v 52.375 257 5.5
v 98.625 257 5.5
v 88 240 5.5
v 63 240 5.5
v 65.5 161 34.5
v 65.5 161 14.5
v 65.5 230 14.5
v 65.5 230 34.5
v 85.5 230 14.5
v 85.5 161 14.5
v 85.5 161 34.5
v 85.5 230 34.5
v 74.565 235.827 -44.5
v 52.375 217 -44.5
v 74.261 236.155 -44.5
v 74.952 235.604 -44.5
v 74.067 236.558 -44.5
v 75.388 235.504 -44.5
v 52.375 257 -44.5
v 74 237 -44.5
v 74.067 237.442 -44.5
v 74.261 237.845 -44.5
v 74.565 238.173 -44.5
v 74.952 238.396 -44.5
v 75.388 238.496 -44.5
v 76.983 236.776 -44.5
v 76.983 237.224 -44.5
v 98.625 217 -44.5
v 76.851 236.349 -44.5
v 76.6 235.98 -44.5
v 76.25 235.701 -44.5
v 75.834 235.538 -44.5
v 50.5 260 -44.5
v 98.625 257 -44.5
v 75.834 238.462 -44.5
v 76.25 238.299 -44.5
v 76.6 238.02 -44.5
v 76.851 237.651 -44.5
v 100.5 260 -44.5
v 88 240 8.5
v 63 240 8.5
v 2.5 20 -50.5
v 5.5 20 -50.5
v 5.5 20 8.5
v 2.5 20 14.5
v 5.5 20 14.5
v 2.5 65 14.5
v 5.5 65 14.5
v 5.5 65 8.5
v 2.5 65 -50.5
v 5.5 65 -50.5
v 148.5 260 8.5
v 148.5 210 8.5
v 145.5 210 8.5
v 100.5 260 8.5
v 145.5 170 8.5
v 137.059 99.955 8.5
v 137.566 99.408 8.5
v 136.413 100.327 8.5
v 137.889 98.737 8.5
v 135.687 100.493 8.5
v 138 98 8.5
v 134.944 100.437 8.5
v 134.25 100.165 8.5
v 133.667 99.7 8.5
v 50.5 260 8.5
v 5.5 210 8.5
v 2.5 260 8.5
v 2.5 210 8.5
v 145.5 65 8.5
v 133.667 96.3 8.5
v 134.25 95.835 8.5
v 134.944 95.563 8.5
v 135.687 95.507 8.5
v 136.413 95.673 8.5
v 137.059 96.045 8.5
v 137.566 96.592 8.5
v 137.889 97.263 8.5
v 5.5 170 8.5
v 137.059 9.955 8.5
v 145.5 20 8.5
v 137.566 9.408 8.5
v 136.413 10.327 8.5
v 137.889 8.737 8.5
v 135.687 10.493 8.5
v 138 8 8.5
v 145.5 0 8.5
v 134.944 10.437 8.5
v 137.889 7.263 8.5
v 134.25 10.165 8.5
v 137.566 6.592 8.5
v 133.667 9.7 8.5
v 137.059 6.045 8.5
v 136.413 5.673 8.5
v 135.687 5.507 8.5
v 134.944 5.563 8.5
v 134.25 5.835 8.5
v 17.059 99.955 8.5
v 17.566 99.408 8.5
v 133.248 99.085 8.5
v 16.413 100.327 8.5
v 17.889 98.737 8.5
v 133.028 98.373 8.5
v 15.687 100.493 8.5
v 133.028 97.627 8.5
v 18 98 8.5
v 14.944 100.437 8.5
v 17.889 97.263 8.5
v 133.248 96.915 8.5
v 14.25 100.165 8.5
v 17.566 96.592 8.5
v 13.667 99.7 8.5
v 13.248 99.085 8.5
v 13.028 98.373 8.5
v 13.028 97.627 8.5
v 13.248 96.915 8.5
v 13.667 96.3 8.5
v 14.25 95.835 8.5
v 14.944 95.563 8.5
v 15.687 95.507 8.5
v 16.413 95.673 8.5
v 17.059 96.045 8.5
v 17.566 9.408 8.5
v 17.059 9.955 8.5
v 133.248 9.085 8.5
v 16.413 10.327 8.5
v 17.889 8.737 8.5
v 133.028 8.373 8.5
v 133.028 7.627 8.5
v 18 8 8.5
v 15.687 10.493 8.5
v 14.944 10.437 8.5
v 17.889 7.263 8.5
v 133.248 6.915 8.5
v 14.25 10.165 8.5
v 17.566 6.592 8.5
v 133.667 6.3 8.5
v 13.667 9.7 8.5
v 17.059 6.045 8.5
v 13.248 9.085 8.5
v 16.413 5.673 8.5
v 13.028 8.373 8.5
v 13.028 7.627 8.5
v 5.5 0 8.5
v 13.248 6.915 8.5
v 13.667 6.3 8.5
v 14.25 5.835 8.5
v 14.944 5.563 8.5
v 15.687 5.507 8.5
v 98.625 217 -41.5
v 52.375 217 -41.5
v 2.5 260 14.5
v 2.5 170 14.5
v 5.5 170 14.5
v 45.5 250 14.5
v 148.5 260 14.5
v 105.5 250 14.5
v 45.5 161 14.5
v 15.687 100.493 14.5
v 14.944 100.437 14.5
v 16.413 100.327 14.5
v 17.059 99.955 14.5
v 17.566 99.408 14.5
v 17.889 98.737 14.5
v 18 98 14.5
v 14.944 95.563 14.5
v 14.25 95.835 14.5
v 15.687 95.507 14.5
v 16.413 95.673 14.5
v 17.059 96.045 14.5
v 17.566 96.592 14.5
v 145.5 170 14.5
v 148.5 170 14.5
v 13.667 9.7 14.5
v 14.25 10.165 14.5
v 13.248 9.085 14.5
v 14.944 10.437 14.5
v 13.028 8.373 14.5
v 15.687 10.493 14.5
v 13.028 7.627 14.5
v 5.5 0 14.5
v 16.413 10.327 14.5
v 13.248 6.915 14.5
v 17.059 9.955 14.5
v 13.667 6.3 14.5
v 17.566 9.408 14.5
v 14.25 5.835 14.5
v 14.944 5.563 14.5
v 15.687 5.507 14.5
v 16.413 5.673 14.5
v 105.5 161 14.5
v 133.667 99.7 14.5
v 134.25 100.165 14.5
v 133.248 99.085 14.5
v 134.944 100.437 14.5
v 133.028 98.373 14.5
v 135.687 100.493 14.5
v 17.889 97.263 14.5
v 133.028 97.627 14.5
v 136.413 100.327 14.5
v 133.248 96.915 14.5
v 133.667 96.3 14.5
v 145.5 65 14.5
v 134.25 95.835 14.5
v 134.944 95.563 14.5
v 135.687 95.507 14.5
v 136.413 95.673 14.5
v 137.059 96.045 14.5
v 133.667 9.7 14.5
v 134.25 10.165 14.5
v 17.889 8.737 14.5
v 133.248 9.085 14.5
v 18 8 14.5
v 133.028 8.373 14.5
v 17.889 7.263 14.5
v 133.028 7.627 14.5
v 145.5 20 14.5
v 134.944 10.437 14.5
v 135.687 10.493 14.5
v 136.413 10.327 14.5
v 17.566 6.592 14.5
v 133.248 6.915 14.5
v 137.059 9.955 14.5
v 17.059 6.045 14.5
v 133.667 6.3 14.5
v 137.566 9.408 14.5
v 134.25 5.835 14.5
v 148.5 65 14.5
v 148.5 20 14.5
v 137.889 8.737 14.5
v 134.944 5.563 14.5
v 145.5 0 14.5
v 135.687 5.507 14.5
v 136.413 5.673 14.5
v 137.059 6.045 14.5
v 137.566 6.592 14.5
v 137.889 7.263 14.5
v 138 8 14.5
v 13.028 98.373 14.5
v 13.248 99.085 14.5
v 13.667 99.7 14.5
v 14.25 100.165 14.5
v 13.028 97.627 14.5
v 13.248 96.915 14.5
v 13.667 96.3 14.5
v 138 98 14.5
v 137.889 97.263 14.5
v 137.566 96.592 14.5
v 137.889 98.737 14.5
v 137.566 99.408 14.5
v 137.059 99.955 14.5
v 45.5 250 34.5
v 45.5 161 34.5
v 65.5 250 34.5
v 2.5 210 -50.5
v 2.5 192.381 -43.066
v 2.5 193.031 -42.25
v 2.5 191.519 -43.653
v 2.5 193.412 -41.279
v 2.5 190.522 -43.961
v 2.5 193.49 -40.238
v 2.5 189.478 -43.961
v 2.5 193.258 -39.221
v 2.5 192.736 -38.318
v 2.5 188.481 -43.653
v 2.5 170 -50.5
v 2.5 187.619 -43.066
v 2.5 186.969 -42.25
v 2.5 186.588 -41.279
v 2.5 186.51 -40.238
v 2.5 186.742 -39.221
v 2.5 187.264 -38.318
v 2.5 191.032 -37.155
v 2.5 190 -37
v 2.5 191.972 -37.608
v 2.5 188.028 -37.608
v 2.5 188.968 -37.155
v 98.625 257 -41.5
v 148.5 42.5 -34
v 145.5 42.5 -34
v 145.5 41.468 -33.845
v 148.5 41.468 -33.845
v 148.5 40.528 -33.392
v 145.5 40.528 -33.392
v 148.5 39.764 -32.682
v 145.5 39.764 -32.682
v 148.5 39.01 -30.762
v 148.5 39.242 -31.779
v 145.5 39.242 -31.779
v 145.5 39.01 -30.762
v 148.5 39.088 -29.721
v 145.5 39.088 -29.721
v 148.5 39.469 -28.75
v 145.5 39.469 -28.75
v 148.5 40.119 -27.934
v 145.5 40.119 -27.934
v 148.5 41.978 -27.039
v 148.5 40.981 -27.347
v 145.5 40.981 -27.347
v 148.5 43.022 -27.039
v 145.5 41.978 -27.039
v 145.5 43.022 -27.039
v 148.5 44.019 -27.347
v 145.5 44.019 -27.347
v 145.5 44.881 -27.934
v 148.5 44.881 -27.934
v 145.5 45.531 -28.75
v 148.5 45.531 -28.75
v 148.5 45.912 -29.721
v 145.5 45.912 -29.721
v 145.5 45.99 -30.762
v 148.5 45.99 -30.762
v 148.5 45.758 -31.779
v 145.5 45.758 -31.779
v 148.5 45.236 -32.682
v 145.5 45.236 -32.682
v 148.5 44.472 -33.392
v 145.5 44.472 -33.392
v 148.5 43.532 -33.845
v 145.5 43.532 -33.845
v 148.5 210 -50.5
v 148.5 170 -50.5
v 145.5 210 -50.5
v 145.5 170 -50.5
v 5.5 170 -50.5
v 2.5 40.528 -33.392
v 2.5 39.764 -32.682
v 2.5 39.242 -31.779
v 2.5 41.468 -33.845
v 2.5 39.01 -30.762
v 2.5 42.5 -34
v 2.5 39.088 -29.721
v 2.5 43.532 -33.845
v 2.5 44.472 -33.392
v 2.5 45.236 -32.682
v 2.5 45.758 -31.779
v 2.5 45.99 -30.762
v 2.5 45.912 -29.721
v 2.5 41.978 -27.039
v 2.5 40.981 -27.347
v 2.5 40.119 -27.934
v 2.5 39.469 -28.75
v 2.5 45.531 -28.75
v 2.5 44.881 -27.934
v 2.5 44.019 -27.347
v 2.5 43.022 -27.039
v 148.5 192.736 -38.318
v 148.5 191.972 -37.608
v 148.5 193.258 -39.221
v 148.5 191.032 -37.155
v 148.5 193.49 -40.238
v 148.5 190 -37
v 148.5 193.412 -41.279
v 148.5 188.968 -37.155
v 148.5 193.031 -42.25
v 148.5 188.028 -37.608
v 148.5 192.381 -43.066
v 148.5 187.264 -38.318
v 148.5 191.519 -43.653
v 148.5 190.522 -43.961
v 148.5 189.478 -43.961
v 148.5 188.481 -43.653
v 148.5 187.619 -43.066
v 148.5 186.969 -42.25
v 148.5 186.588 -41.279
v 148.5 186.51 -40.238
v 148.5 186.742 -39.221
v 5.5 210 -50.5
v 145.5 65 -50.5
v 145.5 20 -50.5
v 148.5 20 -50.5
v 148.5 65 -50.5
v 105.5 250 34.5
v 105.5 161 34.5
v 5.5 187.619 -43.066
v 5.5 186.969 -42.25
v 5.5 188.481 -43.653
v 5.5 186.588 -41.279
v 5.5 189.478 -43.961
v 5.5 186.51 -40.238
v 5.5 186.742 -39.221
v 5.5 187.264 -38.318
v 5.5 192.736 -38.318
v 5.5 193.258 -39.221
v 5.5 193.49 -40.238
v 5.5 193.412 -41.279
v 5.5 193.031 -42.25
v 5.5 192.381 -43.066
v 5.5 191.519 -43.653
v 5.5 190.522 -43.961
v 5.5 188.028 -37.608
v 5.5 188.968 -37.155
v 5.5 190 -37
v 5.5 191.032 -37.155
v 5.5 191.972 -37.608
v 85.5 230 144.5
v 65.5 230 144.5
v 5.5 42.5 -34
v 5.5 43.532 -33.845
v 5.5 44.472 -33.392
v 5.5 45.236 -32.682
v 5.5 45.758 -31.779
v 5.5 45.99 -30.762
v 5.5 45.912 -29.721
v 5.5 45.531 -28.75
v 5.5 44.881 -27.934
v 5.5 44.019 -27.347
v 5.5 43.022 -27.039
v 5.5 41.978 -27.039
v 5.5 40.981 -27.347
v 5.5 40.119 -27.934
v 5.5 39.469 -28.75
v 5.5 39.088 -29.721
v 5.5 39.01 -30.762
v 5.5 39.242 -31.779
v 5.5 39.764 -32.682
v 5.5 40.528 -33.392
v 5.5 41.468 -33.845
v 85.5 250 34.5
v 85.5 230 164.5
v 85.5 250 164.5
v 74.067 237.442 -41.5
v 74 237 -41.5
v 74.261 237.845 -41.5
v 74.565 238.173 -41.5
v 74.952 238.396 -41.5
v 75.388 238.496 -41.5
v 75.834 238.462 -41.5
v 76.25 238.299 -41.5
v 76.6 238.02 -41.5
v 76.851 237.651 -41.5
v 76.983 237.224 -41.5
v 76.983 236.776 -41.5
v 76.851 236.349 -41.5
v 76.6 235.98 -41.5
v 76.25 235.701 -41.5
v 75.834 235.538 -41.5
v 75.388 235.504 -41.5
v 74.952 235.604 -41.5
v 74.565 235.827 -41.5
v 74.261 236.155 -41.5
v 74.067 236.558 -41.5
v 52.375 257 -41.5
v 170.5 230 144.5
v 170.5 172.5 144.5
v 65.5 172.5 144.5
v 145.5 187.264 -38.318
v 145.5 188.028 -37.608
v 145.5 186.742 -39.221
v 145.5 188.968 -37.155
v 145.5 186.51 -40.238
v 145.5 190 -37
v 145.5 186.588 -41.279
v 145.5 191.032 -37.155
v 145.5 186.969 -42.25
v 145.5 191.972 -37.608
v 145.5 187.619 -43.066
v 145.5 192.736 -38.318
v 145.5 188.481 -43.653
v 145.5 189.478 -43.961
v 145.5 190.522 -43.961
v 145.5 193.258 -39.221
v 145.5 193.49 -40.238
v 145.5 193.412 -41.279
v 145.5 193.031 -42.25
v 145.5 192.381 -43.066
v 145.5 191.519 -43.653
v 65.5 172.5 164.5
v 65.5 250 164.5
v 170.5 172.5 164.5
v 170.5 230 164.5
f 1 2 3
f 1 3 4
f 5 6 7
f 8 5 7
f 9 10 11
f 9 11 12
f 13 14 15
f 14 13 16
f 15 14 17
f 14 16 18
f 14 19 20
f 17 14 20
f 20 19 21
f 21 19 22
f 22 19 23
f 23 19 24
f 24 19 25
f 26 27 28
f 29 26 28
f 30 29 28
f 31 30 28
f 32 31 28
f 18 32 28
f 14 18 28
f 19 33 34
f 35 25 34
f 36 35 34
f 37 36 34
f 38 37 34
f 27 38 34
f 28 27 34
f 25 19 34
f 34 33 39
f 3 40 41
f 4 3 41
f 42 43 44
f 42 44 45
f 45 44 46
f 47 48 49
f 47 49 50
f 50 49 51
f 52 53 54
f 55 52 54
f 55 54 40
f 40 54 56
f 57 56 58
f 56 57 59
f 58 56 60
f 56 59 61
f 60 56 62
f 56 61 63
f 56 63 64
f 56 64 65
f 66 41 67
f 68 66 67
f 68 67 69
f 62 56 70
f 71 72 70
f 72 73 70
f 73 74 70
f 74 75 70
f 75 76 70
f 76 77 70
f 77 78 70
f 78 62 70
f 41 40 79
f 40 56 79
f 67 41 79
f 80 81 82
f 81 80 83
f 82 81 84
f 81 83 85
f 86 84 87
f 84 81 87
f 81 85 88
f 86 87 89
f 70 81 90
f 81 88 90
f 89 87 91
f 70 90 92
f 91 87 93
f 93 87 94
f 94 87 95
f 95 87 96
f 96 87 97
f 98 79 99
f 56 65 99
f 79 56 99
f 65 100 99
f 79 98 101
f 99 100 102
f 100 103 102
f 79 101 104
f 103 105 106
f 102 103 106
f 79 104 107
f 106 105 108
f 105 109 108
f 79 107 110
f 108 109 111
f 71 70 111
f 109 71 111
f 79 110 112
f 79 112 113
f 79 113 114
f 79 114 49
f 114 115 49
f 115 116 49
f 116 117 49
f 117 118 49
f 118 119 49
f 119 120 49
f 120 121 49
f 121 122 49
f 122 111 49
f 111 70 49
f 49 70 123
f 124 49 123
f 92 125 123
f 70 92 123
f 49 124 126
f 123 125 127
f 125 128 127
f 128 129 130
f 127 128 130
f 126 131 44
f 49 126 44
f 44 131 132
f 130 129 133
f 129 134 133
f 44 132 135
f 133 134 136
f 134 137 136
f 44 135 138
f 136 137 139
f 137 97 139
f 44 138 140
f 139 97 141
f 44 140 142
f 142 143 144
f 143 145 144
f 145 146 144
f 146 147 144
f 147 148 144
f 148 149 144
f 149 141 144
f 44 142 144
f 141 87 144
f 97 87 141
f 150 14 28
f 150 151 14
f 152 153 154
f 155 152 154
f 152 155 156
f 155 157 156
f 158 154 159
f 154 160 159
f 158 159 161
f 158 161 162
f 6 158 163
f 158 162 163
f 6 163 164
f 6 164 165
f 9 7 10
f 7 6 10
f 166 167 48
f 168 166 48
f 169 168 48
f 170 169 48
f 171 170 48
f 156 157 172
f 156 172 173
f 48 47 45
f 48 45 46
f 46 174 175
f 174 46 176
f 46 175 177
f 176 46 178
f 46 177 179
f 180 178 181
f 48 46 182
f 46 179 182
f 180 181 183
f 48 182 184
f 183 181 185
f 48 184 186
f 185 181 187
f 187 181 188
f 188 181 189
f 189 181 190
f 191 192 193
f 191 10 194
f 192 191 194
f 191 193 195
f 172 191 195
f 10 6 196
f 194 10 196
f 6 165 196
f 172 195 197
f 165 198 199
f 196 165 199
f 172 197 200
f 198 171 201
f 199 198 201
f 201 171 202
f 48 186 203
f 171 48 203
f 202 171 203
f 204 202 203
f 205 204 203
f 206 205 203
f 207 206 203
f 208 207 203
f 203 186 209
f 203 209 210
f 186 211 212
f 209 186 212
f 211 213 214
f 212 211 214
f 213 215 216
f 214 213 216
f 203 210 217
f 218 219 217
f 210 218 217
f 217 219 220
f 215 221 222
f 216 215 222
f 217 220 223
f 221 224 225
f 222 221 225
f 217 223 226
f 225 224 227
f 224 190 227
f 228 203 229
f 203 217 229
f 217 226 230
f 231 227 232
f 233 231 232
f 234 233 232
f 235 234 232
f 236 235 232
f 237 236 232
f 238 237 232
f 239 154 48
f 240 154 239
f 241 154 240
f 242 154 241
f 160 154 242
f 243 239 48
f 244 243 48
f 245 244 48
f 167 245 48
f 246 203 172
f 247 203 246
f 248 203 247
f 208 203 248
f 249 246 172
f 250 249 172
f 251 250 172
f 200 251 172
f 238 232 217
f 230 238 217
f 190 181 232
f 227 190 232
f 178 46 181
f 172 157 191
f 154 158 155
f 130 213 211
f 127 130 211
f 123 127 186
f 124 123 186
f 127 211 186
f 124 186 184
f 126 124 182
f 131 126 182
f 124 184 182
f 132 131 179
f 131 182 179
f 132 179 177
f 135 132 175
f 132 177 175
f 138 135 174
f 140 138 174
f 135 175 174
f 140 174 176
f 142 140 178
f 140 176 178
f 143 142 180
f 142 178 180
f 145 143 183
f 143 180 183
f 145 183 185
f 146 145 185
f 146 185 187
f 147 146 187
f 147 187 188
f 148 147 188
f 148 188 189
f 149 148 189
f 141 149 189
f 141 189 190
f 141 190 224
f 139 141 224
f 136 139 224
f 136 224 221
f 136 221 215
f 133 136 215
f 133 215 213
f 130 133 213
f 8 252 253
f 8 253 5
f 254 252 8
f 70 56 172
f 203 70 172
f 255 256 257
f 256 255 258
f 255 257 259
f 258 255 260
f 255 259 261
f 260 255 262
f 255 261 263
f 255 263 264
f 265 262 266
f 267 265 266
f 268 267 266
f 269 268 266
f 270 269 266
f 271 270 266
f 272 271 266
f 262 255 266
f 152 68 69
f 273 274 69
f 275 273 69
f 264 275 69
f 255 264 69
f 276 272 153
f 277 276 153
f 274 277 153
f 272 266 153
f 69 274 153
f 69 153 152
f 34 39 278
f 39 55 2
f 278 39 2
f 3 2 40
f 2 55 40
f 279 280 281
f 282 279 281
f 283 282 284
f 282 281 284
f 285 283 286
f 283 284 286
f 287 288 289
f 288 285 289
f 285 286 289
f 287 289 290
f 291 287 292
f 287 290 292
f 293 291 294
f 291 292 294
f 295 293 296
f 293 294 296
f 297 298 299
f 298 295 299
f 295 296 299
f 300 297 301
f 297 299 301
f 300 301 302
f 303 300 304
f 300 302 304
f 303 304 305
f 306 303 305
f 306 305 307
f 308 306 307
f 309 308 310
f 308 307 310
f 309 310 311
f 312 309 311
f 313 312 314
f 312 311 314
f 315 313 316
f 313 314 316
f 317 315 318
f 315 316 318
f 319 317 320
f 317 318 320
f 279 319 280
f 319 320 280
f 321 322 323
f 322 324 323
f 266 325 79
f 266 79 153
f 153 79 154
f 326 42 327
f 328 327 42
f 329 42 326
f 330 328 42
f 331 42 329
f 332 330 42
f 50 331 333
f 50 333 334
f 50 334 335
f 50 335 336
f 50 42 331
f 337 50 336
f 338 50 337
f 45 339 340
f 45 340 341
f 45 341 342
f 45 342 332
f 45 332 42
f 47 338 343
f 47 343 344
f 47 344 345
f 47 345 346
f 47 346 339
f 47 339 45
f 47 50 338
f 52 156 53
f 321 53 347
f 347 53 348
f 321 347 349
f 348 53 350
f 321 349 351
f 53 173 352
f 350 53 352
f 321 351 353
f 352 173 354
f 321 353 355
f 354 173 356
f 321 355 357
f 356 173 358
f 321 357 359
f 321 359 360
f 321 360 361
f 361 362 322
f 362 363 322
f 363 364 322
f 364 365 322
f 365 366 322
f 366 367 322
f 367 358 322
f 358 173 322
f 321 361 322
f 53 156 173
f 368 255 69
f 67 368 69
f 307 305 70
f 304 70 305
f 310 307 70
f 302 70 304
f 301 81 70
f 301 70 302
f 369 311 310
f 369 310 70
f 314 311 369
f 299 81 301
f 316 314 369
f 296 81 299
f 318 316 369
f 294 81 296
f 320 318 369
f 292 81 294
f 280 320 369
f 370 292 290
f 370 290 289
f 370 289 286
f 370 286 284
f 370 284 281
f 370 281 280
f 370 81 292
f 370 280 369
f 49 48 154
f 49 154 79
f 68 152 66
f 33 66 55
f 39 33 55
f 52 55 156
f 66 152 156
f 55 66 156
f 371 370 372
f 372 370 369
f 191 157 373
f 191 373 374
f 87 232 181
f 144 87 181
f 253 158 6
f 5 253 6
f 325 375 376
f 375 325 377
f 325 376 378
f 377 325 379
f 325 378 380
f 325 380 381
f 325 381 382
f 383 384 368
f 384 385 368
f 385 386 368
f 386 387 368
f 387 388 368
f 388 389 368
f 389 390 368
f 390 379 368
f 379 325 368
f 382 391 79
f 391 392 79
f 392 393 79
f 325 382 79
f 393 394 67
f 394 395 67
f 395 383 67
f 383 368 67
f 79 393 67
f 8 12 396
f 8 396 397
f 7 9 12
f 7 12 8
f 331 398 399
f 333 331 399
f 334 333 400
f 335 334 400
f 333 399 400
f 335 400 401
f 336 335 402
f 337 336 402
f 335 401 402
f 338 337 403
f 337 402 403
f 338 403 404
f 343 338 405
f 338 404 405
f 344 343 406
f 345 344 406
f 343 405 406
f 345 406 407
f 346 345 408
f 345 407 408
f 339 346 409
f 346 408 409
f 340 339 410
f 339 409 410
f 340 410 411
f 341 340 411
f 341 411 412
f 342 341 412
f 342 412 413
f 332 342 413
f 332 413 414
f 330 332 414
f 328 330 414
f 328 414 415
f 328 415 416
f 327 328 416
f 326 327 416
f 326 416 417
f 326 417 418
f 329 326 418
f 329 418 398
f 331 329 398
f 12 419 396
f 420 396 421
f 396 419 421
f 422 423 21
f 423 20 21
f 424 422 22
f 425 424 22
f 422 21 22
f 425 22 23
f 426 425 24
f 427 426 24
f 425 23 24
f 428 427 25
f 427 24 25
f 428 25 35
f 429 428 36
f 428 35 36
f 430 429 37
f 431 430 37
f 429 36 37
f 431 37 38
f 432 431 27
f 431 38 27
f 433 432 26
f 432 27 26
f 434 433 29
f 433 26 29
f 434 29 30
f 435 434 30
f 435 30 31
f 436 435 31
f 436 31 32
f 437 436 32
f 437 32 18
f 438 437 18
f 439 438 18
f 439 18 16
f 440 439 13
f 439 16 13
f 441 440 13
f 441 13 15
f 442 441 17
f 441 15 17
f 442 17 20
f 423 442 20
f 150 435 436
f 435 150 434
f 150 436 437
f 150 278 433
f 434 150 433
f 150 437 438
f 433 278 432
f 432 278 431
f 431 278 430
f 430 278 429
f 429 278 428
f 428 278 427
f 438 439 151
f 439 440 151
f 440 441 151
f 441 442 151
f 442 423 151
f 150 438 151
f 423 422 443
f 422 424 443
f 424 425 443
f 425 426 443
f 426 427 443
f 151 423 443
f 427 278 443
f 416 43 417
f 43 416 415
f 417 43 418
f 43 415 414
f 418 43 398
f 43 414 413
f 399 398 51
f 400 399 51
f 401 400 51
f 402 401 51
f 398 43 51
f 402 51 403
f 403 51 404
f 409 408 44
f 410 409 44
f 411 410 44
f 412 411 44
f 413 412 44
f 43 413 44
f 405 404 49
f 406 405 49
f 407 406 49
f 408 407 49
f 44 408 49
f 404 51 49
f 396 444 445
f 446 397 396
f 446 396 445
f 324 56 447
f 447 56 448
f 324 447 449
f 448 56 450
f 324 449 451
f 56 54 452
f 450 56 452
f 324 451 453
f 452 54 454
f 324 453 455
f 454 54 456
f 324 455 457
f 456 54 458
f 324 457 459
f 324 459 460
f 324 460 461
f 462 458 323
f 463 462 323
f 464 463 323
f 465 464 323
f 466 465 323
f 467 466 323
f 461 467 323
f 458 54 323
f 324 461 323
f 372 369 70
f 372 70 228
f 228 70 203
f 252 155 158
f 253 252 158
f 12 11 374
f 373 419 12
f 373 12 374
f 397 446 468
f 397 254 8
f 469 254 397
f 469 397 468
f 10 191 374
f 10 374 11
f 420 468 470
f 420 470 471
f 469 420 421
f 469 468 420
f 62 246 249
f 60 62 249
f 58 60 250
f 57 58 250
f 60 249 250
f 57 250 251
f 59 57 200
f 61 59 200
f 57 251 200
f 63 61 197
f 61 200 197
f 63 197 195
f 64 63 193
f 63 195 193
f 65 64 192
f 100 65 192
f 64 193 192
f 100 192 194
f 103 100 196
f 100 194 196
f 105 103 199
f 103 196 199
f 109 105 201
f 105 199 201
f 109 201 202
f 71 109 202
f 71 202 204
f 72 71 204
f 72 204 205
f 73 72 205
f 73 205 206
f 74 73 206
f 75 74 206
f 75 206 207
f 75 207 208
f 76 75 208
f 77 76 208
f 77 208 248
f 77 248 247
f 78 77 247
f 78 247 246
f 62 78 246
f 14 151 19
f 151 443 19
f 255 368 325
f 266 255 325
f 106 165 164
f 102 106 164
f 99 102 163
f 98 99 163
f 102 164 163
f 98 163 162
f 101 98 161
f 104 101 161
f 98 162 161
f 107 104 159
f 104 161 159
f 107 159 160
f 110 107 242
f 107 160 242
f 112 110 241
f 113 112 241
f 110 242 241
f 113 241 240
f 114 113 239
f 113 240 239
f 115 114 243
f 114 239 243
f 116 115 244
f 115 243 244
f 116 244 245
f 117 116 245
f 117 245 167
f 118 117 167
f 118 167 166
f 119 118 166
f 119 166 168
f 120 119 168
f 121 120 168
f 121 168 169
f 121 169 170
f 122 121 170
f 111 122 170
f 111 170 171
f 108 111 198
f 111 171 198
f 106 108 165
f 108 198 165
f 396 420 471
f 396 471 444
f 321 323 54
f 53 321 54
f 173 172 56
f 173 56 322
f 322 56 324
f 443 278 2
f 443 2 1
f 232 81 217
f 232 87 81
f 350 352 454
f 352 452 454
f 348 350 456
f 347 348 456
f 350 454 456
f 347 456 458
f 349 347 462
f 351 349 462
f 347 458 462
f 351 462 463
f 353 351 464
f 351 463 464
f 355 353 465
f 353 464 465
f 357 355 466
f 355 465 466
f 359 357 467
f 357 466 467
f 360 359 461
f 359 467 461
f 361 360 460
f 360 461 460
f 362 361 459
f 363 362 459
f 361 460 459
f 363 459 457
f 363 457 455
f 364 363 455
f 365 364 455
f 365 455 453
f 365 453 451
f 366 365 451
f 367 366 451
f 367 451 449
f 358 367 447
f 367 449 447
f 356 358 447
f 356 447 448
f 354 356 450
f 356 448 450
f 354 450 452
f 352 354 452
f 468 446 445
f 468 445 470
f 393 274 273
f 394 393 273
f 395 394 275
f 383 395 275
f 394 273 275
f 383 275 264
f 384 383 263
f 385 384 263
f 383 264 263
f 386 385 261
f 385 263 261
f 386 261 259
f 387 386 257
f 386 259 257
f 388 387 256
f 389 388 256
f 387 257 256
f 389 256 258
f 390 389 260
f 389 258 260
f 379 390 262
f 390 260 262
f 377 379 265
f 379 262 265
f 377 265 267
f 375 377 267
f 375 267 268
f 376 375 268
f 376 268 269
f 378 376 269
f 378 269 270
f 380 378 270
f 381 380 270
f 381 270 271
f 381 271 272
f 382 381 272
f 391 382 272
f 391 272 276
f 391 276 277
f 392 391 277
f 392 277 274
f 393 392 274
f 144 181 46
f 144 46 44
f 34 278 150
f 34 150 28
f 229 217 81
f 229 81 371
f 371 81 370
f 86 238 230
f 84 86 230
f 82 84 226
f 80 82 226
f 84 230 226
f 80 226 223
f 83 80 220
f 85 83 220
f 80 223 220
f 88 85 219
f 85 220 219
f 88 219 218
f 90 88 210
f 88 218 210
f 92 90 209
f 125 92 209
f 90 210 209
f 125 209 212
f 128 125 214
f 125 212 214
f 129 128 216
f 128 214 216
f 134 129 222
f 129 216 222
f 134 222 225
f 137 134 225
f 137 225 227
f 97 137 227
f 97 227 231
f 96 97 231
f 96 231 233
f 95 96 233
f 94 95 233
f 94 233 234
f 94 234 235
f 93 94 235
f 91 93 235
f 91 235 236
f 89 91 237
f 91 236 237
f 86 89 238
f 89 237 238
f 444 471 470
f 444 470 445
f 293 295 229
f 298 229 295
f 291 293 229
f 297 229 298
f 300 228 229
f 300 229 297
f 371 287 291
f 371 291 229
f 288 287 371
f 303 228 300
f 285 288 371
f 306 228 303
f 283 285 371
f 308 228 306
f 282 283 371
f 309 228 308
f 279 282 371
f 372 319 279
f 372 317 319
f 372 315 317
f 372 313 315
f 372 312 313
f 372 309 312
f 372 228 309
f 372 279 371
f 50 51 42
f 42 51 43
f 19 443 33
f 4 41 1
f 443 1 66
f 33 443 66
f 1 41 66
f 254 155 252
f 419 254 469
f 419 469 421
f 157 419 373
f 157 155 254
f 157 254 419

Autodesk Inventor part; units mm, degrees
sketch "Sketch2" plane through (0, 0, 0) normal (0, 1, 0) x (-1, 0, 0)
  line L0 (-25.5, 14.5) -> (-5.5, 14.5)
  line L1 (-5.5, 14.5) -> (-5.5, -5.5)
  line L2 (-5.5, -5.5) -> (-25.5, -5.5)
  line L3 (-25.5, -5.5) -> (-25.5, 14.5)
  line L4 (-25.5, 14.5) -> (-5.5, -5.5) construction
  line L5 (-5.5, 14.5) -> (-25.5, -5.5) construction
  point P0 (0, 0)
  point P1 (-15.5, 4.5)
  dimension "d0" = 20
  dimension "d1" = 20
extrude "Extrusion1" add sketch "Sketch2" along normal blind 210
sketch "Sketch3" plane through (25.5, 0, 14.5) normal (1, 0, 0) x (0, 0, -1)
  line L0 (20, 0) -> (20, 210) projected
  line L1 (0, 137.5) -> (20, 137.5)
  line L2 (20, 137.5) -> (20, 117.5)
  line L3 (20, 117.5) -> (0, 117.5)
  line L4 (0, 117.5) -> (0, 137.5)
  line L5 (0, 137.5) -> (20, 117.5) construction
  line L6 (20, 137.5) -> (0, 117.5) construction
  point P0 (14.5, 0)
  point P1 (10, 127.5)
  dimension "d4" = 20
extrude "Extrusion2" add sketch "Sketch3" along normal blind 100
ref_plane "Work Plane1" through (75.5, 0, 14.5) normal (1, 0, 0) x (0, 0, -1)
mirror "Mirror1" about plane through (75.5, 0, 14.5) normal (1, 0, 0) of "Extrusion1"
sketch "Sketch4" plane through (5.5, 0, 14.5) normal (0, 0, 1) x (1, 0, 0)
  line L0 (60, 250) -> (80, 250)
  line L1 (80, 250) -> (80, 230)
  line L2 (80, 230) -> (60, 230)
  line L3 (60, 230) -> (60, 250)
  line L4 (60, 250) -> (80, 230) construction
  line L5 (80, 250) -> (60, 230) construction
  point P0 (-5.5, 0)
  point P1 (20, 112.5)
  point P2 (70, 240)
extrude "Extrusion3" add sketch "Sketch4" along normal blind 150
sketch "Sketch11" plane through (5.5, 0, 14.5) normal (0, 0, 1) x (1, 0, 0)
  circle A0 centre (10, 8) radius 2.5
  circle A1 centre (10, 98) radius 2.5
  circle A2 centre (130, 8) radius 2.5
  circle A3 centre (130, 98) radius 2.5
  point P0 (-5.5, 0)
  dimension "d25" = 5
  dimension "d28" = 90
  dimension "d31" = 120
  dimension "d39" = 120
extrude "Extrusion10" cut sketch "Sketch11" against normal blind 36
sketch "Sketch13" plane through (5.5, 0, 14.5) normal (0, 0, 1) x (1, 0, 0)
  circle A0 centre (130, 8) radius 2.5 projected
  circle A1 centre (10, 8) radius 2.5 projected
  circle A2 centre (10, 98) radius 2.5 projected
  circle A3 centre (130, 98) radius 2.5 projected
  line L0 (0, 110) -> (150, 110)
  line L1 (0, 110) -> (0, 0)
  line L2 (0, 0) -> (150, 0)
  line L3 (150, 0) -> (150, 110)
  line L4 (0, 110) -> (0, 55)
  line L5 (0, 55) -> (150, 55)
  point P0 (-5.5, 0)
  dimension "d36" = 55
sketch "Sketch14" plane through (145.5, 0, 14.5) normal (1, 0, 0) x (0, 0, -1)
  line L0 (0, 20) -> (65, 20)
  line L1 (65, 20) -> (65, 65)
  line L2 (65, 65) -> (0, 65)
  line L3 (0, 65) -> (0, 20)
  circle A0 centre (45, 42.5) radius 3.5
  dimension "d44" = 7
  dimension "d45" = 20
  dimension "d94" = 22.5
ref_plane "Work Plane2" through (75.5, 250, 14.5) normal (1, 0, 0) x (0, 0, -1)
extrude "Extrusion12" add sketch "Sketch14" along normal blind 3
mirror "Mirror3" about plane through (75.5, 250, 14.5) normal (1, 0, 0) of "Extrusion12"
sketch "Sketch15" plane through (5.5, 0, 14.5) normal (0, 0, 1) x (1, 0, 0)
  line L0 (0, 0) -> (0, 20) projected
  line L1 (20, 0) -> (0, 0) projected
  line L2 (0, 0) -> (140, 0)
  line L3 (140, 0) -> (140, 110)
  line L4 (0, 110) -> (0, 0)
  line L5 (0, 110) -> (140, 110)
  circle A0 centre (10, 98) radius 2.5 projected
  circle A1 centre (10, 8) radius 2.5 projected
  circle A2 centre (130, 98) radius 2.5 projected
  circle A3 centre (130, 8) radius 2.5 projected
  point P0 (-5.5, 0)
sketch "Sketch18" plane through (5.5, 210, -5.5) normal (-1, 0, 0) x (0, 0, 1)
  line L0 (20, 0) -> (-45, 0)
  line L1 (-45, 0) -> (-45, -40)
  line L2 (-45, -40) -> (20, -40)
  line L3 (20, -40) -> (20, 0)
  point P0 (5.5, -210)
  point P1 (-35, -20)
  dimension "d51" = 65
  dimension "d92" = 10
  dimension "d93" = 20
extrude "Extrusion13" add sketch "Sketch18" along normal blind 3
mirror "Mirror4" about plane through (75.5, 250, 14.5) normal (1, 0, 0) of "Extrusion13"
sketch "Sketch19" plane through (2.5, 210, -5.5) normal (-1, 0, 0) x (0, 0, 1)
  line L0 (-45, 0) -> (-45, -40) projected
  circle A0 centre (-35, -20) radius 3.5
  point P0 (5.5, -210)
  dimension "d54" = 7
  dimension "d55" = 10
extrude "Extrusion14" cut sketch "Sketch19" against normal through all
sketch "Sketch20" plane through (25.5, 0, 14.5) normal (1, 0, 0) x (0, 0, -1)
  line L0 (20, 117.5) -> (0, 117.5) projected
  line L1 (0, 0) -> (0, 117.5) projected
  line L2 (20, 0) -> (0, 0) projected
  line L3 (0, 0) -> (0, 117.5)
  line L4 (6, 117.5) -> (6, 0)
  line L5 (0, 137.5) -> (0, 210) projected
  line L6 (0, 210) -> (20, 210) projected
  line L7 (6, 210) -> (6, 137.5)
  line L8 (6, 137.5) -> (0, 137.5)
  point P0 (14.5, 0)
extrude "Extrusion15" add sketch "Sketch20" along normal up to next
sketch "Sketch21" plane through (0, 0, 0) normal (0, -1, 0) x (1, 0, 0)
  line L0 (145.5, 14.5) -> (145.5, -5.5) projected
  line L1 (5.5, -5.5) -> (145.5, -5.5)
  line L2 (145.5, -5.5) -> (145.5, 8.5)
  line L3 (145.5, 8.5) -> (5.5, 8.5)
  line L4 (5.5, 8.5) -> (5.5, -5.5)
  point P0 (0, 0)
extrude "Extrusion16" cut sketch "Sketch21" against normal through all
sketch "Sketch22" plane through (145.5, 210, 8.5) normal (0, 0, -1) x (-1, 0, 0)
  line L0 (0, 0) -> (140, 0) projected
  line L1 (70, 50) -> (45, 50)
  line L2 (70, 50) -> (95, 50)
  line L3 (70, 30) -> (82.5, 30)
  line L4 (82.5, 30) -> (70, 30)
  line L5 (82.5, 30) -> (95, 50)
  line L6 (57.5, 30) -> (70, 30)
  line L7 (57.5, 30) -> (45, 50)
  point P0 (145.5, -210)
  point P1 (70, 50)
extrude "Extrusion17" add sketch "Sketch22" along normal blind 3
sketch "Sketch25" plane through (0, 210, 0) normal (0, 1, 0) x (1, 0, 0)
  line L0 (145.5, -8.5) -> (5.5, -8.5) projected
  line L1 (148.5, -14.5) -> (148.5, 50.5) projected
  line L2 (2.5, -14.5) -> (148.5, -14.5)
  line L3 (148.5, -14.5) -> (148.5, -8.5)
  line L4 (148.5, -8.5) -> (2.5, -8.5)
  line L5 (2.5, -8.5) -> (2.5, -14.5)
  point P0 (100.5, -8.5)
  point P1 (0, 0)
extrude "Extrusion20" add sketch "Sketch25" along normal blind 50
sketch "Sketch26" plane through (145.5, 210, 5.5) normal (0, 0, -1) x (-1, 0, 0)
  line L0 (95, 50) -> (45, 50) projected
  line L1 (45, 50) -> (57.5, 30) projected
  line L2 (57.5, 30) -> (82.5, 30) projected
  line L3 (82.5, 30) -> (95, 50) projected
  line L4 (46.875, 47) -> (93.125, 47)
  point P0 (145.5, -210)
  dimension "d73" = 3
extrude "Extrusion21" add sketch "Sketch26" along normal blind 50 contours L3 L4 L1 L0
sketch "Sketch27" plane through (52.375, 257, 5.5) normal (0, -1, 0) x (1, 0, 0)
  line L0 (46.25, 0) -> (46.25, -50) projected
  line L1 (0, -50) -> (46.25, -50)
  line L2 (46.25, -50) -> (46.25, -47)
  line L3 (46.25, -47) -> (0, -47)
  line L4 (0, -47) -> (0, -50)
  point P0 (-52.375, -5.5)
extrude "Extrusion22" add sketch "Sketch27" along normal blind 40
sketch "Sketch28" plane through (5.5, 0, 14.5) normal (0, 0, 1) x (1, 0, 0)
  line L0 (60, 250) -> (40, 250)
  line L1 (40, 250) -> (40, 161)
  line L2 (40, 161) -> (60, 161)
  line L3 (60, 161) -> (60, 250)
  line L4 (80, 250) -> (100, 250)
  line L5 (100, 250) -> (100, 161)
  line L6 (100, 161) -> (80, 161)
  line L7 (80, 161) -> (80, 250)
  point P0 (-5.5, 0)
extrude "Extrusion23" add sketch "Sketch28" along normal blind 20
ref_plane "Work Plane3" through (85.5, 117.5, 14.5) normal (-1, 0, 0) x (0, 0, 1)
sketch "Sketch29" plane through (85.5, 117.5, 14.5) normal (-1, 0, 0) x (0, 0, 1)
  line L0 (130, 112.5) -> (150, 112.5) projected
  line L1 (130, 112.5) -> (130, 55) projected
  line L2 (130, 55) -> (150, 55) projected
  line L3 (150, 55) -> (150, 112.5) projected
  point P0 (-14.5, -117.5)
extrude "Extrusion24" add sketch "Sketch29" along normal blind 20
ref_plane "Work Plane4" through (170.5, 117.5, 14.5) normal (1, 0, 0) x (0, 0, -1)
sketch "Sketch32" plane through (85.5, 230, 34.5) normal (1, 0, 0) x (0, 0, -1)
  line L0 (-130, -57.5) -> (-130, 20) projected
  line L1 (-110, -57.5) -> (-130, -57.5) projected
  line L2 (-110, 0) -> (-110, -57.5) projected
  line L3 (0, 0) -> (-110, 0) projected
  line L4 (-130, 0) -> (-110, 0)
  point P0 (34.5, -230)
extrude "Extrusion26" add sketch "Sketch32" along normal blind 85
sketch "Sketch34" plane through (145.5, 210, -44.5) normal (0, 0, -1) x (-1, 0, 0)
  circle A0 centre (70, 27) radius 1.5
  point P0 (145.5, -210)
  dimension "d89" = 3
extrude "Extrusion27" cut sketch "Sketch34" against normal blind 5
properties part number "robot chasis"
